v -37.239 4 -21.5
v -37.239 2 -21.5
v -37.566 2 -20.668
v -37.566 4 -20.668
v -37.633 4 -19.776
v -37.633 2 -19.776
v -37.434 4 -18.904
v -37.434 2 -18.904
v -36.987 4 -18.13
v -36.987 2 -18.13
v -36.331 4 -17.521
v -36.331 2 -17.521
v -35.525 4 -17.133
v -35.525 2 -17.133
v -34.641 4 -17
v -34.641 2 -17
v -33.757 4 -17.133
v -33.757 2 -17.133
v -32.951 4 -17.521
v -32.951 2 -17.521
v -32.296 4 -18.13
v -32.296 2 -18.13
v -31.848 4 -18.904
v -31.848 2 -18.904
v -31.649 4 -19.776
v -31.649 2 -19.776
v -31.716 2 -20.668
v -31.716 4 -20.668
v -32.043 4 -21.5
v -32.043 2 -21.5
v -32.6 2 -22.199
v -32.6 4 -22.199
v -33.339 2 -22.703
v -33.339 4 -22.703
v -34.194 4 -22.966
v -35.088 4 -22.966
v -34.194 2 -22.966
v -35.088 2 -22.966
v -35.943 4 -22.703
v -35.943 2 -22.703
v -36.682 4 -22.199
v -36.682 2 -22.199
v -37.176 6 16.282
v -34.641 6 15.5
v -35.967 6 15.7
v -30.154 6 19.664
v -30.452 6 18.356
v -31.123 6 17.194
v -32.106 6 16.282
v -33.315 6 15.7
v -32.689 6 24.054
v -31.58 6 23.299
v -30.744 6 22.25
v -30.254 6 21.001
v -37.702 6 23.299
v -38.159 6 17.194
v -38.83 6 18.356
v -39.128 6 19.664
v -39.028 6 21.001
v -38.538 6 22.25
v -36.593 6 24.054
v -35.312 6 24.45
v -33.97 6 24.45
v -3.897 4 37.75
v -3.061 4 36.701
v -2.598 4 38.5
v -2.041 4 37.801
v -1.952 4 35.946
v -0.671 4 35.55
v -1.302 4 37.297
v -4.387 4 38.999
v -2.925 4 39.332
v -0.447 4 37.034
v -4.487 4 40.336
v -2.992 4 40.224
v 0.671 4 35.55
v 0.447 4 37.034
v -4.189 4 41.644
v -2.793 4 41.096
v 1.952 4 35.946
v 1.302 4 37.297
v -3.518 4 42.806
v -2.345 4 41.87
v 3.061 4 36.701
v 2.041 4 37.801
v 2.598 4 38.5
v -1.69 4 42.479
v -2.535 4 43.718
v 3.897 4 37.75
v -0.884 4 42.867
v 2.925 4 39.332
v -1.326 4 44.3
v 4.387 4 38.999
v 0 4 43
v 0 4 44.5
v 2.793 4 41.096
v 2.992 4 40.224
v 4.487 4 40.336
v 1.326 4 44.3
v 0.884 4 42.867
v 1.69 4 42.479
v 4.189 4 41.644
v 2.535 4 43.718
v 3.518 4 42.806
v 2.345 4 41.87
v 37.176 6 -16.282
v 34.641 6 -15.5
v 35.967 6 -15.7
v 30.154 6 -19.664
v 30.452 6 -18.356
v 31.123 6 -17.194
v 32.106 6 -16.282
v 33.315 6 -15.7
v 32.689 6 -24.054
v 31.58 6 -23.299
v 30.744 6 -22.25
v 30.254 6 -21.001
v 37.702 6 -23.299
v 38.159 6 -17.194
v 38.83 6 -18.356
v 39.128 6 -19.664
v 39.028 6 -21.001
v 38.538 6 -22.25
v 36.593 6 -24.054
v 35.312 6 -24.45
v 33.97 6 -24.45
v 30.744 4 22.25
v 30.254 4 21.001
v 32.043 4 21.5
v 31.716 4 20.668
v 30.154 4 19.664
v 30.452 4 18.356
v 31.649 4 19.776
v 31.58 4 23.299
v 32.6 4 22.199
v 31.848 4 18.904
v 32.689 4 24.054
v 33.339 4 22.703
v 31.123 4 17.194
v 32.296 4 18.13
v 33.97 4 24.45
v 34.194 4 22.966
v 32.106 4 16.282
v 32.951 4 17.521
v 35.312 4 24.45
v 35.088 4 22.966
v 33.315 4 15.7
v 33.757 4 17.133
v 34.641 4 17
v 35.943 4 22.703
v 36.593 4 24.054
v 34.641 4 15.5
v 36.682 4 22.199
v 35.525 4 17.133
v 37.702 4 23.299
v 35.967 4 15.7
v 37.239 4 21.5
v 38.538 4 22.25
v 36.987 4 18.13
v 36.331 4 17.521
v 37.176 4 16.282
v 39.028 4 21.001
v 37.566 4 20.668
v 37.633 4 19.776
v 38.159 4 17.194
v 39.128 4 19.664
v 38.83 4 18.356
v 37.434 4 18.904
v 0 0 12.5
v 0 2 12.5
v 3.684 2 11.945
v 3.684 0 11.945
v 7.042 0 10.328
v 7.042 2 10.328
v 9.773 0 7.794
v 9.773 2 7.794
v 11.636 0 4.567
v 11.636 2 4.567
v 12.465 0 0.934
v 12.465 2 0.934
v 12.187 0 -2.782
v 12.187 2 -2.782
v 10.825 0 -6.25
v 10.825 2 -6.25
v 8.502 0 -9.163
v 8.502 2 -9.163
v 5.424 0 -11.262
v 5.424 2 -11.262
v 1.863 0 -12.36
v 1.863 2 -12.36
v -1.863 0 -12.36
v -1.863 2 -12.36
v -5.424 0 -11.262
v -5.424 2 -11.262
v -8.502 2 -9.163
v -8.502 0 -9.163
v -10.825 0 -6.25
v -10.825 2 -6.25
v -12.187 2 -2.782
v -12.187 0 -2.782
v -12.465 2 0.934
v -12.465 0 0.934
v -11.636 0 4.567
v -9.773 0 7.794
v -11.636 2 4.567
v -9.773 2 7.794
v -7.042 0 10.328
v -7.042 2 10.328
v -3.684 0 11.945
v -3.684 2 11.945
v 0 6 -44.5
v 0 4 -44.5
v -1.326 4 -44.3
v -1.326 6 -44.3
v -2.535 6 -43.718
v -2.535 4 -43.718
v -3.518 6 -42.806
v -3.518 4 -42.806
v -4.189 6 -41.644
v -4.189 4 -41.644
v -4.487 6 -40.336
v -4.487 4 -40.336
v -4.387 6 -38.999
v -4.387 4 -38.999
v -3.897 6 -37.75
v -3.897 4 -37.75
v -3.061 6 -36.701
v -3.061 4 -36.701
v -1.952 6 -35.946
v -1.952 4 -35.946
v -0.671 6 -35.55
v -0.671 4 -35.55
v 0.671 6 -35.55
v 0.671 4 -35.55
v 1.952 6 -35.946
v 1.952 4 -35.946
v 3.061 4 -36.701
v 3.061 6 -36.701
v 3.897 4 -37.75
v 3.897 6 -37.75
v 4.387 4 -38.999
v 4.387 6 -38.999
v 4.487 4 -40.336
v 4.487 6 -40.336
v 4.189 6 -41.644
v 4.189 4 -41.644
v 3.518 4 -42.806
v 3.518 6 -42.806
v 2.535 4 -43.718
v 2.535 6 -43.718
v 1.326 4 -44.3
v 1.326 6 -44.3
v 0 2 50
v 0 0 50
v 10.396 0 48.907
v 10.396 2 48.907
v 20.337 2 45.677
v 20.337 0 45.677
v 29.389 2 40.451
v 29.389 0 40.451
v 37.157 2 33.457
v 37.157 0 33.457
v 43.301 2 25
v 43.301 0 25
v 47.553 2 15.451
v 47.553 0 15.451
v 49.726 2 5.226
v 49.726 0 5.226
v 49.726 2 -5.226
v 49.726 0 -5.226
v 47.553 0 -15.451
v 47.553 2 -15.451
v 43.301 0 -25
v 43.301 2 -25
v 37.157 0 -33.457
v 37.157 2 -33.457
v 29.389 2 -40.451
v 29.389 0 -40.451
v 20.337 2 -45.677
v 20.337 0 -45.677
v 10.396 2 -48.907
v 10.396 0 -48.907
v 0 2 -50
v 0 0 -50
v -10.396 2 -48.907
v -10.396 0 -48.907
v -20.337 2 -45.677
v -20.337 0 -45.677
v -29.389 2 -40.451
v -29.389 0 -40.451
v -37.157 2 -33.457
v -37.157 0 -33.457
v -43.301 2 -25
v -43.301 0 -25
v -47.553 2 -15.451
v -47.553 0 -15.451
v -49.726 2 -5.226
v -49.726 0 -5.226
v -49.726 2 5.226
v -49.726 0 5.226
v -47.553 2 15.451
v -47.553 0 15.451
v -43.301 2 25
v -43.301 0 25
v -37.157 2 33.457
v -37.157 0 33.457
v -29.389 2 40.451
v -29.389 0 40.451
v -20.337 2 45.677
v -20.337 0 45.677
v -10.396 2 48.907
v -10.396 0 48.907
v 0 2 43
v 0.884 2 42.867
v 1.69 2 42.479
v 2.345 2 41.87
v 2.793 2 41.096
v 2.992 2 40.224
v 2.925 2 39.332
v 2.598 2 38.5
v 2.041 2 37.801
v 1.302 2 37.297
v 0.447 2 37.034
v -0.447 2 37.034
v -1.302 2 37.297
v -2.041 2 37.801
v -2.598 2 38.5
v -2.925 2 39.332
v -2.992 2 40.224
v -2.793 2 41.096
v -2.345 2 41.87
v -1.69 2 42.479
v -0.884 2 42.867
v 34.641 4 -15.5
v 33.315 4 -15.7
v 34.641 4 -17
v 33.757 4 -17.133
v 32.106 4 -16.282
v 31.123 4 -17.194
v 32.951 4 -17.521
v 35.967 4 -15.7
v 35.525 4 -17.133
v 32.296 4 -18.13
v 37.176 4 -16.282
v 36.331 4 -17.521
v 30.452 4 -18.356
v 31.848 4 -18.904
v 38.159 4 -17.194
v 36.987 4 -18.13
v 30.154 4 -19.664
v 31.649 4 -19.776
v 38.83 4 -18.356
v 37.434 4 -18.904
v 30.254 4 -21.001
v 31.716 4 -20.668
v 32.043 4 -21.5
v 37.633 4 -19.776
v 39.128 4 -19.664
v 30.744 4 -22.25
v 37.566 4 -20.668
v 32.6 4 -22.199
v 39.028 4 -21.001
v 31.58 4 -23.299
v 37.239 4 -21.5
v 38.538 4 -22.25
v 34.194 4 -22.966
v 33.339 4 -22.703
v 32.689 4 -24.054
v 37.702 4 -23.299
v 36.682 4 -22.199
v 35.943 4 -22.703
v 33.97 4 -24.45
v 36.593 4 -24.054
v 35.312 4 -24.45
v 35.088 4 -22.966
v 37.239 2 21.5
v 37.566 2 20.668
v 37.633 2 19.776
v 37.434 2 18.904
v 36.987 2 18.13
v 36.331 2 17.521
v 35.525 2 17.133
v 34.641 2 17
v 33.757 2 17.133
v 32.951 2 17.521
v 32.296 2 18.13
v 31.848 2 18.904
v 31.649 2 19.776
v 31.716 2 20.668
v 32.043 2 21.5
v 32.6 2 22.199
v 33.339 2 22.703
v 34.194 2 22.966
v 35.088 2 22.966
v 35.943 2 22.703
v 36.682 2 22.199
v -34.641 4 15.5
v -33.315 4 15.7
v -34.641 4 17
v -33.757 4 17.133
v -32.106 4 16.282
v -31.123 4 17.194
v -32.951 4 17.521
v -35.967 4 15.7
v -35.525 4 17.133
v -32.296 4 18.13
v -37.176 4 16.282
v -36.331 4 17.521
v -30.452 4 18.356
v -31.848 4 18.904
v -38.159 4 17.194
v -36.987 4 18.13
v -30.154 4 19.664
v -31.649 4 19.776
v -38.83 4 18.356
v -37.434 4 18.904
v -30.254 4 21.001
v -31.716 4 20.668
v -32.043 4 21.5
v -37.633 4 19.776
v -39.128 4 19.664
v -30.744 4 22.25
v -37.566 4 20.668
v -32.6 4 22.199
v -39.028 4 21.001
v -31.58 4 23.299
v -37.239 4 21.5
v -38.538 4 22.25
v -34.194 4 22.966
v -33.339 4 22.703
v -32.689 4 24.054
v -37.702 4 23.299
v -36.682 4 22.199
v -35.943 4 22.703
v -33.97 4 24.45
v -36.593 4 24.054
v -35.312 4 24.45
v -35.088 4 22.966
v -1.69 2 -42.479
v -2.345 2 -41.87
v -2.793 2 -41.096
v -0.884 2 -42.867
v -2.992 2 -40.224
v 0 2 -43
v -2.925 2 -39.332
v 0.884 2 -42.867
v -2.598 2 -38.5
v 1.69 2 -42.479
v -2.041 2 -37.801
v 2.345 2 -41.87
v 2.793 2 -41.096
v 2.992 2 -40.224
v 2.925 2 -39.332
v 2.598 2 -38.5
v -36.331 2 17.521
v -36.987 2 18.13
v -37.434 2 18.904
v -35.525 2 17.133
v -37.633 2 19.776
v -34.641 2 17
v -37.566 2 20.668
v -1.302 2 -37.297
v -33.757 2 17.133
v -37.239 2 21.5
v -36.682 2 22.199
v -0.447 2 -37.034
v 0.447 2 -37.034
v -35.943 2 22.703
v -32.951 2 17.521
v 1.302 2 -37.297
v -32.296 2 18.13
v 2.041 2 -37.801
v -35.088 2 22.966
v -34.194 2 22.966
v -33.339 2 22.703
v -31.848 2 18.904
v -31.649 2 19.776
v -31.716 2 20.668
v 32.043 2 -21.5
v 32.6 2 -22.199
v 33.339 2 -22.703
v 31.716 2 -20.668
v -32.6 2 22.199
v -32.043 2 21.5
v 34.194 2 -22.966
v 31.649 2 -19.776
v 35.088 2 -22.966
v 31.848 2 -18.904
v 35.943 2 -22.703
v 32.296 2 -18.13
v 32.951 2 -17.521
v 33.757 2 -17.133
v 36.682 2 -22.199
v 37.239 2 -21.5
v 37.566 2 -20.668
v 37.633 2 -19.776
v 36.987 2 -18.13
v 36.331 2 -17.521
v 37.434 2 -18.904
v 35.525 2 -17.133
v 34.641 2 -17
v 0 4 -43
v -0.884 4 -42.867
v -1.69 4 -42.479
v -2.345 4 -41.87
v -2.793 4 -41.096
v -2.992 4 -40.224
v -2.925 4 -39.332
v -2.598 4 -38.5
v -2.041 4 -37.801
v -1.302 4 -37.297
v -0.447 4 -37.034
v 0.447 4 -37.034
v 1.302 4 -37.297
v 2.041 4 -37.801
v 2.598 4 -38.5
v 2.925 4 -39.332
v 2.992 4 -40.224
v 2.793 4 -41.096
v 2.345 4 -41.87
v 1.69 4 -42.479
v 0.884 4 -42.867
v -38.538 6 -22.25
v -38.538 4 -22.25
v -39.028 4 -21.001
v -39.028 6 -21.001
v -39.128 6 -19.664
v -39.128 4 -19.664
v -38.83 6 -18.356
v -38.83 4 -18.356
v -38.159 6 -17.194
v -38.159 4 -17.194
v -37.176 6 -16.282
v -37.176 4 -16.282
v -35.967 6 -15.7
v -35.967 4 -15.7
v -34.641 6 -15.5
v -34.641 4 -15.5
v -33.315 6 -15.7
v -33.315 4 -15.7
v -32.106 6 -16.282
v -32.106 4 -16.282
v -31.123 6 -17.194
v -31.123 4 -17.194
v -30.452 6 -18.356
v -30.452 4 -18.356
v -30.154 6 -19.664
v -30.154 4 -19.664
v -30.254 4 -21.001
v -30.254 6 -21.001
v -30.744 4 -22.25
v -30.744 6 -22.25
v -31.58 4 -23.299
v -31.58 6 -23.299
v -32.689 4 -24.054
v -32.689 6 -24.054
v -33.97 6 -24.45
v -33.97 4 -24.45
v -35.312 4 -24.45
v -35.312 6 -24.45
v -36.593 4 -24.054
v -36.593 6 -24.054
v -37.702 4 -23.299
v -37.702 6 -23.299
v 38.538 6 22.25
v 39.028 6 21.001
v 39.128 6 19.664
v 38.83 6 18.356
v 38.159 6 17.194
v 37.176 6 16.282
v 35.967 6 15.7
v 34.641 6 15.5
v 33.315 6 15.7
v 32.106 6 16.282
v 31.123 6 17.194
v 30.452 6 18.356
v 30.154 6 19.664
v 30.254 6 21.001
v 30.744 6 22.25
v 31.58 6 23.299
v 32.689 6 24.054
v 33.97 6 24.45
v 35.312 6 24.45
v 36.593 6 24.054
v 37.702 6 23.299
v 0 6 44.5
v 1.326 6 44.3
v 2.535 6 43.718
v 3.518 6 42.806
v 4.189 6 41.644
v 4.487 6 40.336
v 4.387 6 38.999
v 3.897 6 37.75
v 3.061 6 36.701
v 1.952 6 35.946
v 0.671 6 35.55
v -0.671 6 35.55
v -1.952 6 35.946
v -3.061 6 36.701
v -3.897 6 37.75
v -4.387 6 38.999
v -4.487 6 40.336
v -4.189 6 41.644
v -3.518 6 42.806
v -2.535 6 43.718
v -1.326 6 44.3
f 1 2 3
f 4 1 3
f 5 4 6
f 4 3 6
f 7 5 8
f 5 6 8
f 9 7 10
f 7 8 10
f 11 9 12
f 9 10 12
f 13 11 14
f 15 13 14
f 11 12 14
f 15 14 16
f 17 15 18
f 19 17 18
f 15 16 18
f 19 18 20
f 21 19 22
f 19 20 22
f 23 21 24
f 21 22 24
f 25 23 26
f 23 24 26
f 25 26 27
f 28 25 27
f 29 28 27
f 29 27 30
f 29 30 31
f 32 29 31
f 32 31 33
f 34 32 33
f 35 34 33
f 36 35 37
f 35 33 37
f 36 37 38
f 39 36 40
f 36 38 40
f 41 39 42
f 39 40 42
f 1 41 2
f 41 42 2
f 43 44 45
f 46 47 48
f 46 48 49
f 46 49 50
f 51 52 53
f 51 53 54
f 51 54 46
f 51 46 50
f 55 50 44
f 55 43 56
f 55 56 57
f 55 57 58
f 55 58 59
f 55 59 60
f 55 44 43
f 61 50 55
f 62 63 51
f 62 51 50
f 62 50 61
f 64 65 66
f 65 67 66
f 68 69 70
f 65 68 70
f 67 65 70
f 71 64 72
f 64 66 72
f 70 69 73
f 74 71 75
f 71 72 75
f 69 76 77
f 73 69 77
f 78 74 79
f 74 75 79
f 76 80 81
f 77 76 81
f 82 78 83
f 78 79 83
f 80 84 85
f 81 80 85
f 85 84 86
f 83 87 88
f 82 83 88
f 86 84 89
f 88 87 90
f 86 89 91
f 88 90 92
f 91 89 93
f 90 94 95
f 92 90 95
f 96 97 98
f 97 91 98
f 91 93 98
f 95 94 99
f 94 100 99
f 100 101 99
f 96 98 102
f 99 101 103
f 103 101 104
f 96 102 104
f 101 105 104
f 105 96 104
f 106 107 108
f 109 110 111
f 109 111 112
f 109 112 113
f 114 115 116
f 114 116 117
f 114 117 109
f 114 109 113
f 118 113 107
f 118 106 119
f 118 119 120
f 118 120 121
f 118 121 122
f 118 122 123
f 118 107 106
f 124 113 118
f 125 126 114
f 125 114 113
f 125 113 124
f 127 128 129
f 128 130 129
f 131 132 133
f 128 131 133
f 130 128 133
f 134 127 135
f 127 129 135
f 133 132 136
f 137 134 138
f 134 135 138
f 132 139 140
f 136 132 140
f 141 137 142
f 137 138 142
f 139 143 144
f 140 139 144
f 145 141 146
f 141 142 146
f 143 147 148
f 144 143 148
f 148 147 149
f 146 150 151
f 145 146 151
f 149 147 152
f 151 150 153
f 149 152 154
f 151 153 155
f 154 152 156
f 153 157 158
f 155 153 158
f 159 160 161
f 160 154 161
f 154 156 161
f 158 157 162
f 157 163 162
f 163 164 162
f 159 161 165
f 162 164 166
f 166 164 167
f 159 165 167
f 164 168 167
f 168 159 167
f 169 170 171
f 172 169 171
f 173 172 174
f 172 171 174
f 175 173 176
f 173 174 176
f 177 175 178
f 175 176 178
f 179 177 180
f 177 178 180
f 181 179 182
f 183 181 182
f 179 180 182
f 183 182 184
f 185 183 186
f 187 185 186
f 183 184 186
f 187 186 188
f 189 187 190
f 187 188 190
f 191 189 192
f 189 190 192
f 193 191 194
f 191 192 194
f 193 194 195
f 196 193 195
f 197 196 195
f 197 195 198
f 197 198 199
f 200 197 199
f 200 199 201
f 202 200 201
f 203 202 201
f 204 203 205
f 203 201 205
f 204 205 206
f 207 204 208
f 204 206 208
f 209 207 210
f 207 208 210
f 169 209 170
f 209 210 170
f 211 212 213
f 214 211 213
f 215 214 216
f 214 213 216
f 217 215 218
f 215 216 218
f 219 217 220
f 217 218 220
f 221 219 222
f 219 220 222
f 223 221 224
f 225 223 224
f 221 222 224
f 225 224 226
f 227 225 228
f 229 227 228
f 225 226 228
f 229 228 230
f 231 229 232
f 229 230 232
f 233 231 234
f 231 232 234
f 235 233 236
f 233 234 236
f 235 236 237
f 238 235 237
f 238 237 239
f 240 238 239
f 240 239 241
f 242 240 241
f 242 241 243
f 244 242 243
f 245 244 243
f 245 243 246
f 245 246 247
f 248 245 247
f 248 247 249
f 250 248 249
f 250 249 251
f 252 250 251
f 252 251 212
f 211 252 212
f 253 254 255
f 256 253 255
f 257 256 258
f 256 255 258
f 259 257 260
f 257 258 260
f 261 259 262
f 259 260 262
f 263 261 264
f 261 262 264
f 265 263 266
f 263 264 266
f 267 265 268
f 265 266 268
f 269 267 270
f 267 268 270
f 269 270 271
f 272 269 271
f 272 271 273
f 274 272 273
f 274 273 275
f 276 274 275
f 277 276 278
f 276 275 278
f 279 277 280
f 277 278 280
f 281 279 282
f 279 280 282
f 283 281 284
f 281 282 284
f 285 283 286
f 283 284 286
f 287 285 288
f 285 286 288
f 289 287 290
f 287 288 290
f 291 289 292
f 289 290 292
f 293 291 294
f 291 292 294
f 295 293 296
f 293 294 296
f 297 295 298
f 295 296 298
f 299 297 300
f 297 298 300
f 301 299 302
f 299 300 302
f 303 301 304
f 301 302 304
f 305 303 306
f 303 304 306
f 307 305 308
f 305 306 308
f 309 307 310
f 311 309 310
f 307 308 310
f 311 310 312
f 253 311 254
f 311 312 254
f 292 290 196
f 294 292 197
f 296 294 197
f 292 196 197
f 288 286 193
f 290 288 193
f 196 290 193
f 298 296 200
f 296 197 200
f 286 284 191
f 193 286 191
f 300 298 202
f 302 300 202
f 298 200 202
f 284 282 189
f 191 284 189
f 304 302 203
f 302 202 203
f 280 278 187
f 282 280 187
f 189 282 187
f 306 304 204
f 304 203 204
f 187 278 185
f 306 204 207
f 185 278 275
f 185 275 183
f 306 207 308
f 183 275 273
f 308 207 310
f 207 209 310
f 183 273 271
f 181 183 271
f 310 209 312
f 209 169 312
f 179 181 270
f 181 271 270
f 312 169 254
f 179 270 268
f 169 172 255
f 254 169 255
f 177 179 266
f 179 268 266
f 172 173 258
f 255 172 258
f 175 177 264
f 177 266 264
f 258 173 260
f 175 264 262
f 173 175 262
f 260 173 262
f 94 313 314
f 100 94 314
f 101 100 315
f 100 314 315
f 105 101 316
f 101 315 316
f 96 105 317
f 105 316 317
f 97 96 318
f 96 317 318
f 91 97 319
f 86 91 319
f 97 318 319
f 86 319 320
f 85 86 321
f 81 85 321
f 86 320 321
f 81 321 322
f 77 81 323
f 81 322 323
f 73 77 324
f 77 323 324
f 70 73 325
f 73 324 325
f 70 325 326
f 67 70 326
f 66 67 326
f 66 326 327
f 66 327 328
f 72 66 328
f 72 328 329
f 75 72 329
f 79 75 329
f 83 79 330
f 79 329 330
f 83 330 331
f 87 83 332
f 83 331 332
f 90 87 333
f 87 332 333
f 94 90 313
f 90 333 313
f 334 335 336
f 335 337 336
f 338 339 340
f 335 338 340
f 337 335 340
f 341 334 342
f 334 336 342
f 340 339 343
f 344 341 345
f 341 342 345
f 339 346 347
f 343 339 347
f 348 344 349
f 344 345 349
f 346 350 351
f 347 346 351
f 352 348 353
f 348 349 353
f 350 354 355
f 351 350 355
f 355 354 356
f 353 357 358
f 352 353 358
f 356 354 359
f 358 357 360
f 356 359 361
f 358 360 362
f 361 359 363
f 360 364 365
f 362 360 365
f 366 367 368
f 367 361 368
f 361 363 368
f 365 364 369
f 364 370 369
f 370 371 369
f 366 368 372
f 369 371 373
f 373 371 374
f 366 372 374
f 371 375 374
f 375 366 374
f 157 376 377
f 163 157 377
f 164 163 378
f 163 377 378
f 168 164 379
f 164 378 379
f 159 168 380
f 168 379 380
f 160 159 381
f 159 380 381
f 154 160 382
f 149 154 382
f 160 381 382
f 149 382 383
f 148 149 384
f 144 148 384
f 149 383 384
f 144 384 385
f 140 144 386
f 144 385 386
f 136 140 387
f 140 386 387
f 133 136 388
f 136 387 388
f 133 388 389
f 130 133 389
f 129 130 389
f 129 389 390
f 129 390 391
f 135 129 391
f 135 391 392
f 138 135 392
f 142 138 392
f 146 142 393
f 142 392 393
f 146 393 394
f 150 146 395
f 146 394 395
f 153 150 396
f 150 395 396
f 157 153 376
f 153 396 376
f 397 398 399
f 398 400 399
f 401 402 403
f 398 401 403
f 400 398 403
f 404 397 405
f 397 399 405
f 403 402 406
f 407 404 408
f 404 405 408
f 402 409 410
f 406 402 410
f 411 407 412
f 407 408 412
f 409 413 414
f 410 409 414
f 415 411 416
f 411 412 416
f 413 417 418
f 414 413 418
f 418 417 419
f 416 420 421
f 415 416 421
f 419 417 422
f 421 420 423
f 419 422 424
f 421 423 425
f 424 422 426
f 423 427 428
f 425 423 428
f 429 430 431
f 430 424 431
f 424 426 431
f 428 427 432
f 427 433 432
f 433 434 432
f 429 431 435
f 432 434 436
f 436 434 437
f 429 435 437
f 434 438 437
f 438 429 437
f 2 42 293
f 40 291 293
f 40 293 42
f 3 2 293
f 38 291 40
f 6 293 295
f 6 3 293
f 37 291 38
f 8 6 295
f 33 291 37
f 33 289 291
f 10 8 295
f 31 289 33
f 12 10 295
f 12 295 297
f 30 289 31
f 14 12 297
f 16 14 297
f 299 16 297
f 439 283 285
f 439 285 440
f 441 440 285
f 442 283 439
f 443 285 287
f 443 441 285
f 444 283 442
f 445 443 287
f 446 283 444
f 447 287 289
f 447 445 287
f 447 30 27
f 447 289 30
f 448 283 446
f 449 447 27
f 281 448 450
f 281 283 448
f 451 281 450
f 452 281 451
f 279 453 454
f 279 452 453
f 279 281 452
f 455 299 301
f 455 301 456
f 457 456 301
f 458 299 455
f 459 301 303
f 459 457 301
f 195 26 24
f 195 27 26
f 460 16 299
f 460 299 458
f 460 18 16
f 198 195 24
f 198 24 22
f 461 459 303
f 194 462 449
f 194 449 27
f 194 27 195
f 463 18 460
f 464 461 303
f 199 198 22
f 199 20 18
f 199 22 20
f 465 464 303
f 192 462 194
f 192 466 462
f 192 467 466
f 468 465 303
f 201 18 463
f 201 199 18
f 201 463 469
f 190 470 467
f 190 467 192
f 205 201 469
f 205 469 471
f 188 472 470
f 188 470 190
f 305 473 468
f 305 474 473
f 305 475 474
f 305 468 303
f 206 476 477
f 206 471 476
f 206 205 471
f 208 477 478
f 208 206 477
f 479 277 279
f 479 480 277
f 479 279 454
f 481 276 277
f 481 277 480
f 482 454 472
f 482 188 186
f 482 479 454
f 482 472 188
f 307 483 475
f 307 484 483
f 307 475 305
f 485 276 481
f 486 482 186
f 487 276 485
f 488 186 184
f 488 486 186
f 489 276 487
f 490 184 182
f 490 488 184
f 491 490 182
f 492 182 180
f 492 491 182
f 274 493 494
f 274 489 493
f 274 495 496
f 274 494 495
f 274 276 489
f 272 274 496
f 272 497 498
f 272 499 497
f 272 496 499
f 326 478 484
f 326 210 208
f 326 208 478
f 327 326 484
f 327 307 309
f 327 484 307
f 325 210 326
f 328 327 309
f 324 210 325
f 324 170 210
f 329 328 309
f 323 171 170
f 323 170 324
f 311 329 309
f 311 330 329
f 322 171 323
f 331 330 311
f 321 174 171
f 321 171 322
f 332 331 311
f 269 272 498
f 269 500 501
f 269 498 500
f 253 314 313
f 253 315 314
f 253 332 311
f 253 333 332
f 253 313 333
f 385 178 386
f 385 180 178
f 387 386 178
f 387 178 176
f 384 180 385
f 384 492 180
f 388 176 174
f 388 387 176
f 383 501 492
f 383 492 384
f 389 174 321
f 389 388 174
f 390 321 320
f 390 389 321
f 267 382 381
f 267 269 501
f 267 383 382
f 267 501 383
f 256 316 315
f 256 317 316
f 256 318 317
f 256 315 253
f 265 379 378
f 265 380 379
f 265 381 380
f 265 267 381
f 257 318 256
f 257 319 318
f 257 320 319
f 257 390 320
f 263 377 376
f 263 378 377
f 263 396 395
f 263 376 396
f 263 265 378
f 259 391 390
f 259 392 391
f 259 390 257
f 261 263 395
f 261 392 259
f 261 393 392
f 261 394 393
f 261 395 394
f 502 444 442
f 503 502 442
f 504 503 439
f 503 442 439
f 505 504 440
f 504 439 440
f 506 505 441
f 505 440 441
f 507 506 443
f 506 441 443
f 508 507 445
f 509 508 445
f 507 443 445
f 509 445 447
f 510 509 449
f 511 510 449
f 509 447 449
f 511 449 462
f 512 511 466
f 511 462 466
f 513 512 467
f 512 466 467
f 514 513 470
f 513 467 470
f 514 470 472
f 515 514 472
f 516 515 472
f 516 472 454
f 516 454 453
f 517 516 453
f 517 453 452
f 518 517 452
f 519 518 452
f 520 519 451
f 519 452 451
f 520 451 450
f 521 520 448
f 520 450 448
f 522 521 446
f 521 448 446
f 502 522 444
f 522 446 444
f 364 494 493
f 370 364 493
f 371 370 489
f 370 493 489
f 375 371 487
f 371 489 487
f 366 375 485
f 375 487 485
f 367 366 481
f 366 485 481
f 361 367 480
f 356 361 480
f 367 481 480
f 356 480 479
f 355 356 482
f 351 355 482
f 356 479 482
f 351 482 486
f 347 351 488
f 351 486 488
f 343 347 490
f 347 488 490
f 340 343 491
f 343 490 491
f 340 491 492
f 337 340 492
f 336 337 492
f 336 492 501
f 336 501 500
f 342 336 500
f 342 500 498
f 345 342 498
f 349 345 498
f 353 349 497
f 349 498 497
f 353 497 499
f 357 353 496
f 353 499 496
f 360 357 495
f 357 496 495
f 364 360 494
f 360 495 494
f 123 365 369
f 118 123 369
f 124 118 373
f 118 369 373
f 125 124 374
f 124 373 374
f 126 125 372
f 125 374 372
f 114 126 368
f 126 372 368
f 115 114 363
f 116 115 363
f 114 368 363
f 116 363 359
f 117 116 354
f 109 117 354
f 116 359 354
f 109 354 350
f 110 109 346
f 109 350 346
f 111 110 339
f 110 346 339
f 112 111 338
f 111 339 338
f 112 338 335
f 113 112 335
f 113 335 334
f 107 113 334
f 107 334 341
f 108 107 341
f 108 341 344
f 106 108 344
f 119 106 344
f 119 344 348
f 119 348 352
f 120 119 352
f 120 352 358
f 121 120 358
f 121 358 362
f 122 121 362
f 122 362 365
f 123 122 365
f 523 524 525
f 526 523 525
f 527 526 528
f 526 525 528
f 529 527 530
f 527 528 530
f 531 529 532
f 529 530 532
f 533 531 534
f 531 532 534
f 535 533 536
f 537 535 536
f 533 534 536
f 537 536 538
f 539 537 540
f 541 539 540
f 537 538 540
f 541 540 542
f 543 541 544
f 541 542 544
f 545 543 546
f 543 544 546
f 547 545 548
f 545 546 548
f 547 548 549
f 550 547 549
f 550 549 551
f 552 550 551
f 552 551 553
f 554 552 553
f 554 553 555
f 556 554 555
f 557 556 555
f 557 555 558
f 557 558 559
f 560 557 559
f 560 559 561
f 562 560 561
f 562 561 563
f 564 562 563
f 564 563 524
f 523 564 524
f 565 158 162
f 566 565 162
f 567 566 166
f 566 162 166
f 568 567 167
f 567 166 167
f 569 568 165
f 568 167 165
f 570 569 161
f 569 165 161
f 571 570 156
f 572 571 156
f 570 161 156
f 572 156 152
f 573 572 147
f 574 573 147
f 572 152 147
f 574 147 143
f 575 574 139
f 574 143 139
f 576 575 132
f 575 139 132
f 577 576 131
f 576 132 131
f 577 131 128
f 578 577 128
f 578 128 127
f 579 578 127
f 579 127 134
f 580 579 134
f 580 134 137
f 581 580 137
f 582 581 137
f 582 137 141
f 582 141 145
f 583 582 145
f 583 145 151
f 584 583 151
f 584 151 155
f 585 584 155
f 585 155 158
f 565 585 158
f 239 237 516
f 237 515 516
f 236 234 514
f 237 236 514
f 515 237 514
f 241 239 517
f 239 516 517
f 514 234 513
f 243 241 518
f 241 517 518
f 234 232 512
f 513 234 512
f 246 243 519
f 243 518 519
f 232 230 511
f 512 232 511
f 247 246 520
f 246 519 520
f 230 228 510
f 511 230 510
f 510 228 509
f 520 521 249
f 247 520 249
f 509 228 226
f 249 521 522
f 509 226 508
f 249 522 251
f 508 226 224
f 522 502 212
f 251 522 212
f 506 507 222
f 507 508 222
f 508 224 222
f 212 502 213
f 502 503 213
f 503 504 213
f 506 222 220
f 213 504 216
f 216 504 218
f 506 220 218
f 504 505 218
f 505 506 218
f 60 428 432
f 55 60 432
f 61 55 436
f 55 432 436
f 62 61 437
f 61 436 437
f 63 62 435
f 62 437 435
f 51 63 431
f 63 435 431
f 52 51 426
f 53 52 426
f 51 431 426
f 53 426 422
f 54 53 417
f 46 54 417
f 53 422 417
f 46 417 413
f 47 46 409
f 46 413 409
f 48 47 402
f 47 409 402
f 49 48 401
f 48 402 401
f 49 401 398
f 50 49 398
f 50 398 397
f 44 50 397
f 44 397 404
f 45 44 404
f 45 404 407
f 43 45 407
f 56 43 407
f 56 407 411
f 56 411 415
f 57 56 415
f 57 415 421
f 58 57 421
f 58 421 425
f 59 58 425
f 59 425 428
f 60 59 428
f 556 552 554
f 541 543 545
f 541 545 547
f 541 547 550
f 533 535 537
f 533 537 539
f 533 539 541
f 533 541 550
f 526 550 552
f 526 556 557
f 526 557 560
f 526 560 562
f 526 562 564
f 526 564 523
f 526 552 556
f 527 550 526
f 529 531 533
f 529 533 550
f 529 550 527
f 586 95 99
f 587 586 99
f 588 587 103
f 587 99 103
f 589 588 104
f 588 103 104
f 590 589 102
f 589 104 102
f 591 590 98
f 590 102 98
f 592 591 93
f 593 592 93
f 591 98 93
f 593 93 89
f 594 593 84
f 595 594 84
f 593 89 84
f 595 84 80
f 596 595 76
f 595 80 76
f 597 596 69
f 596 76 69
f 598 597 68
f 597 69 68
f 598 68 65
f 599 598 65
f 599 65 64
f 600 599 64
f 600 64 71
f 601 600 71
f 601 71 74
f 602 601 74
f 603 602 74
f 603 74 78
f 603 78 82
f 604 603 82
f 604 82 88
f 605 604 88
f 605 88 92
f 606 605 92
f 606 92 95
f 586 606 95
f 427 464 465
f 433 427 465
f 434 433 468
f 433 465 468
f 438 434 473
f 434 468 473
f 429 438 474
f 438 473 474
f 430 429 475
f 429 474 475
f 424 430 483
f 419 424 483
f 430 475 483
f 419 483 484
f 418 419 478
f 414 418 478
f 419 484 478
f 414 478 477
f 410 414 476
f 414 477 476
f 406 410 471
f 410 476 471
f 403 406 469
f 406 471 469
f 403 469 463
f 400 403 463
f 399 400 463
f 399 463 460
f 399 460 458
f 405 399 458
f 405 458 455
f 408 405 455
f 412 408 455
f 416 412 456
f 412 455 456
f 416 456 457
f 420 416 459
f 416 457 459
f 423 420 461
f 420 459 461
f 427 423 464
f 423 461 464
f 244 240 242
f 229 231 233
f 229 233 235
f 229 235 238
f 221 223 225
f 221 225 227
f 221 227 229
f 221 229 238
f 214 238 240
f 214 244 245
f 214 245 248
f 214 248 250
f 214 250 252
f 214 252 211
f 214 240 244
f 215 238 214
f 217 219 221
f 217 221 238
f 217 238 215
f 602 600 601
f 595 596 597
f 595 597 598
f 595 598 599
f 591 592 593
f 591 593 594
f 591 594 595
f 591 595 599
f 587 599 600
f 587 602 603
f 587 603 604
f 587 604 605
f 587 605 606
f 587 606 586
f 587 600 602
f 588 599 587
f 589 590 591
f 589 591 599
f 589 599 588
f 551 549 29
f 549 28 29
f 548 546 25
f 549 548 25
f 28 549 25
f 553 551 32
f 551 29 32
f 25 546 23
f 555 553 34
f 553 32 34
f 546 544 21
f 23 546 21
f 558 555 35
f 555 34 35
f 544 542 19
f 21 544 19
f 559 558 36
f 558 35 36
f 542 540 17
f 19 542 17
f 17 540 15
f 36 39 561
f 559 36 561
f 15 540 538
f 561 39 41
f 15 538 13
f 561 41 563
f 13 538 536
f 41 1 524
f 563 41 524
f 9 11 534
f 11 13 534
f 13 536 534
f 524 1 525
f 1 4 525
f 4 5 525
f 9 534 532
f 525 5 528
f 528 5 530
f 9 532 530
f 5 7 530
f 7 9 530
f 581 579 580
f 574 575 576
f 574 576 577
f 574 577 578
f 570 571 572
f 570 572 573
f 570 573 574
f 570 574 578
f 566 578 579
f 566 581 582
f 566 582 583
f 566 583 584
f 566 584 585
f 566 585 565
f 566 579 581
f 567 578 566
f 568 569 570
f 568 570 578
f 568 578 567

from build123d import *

# Parameters (mm, degrees)
SKETCH1_R           = 50
BOSS_EXTRUDE1_DEPTH = 2
SKETCH2_R           = 12.5
CUT_EXTRUDE1_DEPTH  = 2
SKETCH2_3_R         = 4.5
BOSS_EXTRUDE2_DEPTH = 4
SKETCH2_4_R         = 4.5
SKETCH2_4_R_2       = 3
CUT_EXTRUDE2_DEPTH  = 2
CIRPATTERN1_COUNT   = 12


with BuildPart() as part:
    # Sketch1 → Boss-Extrude1 (new body)
    with BuildSketch(Plane(origin=(0, 0, 0), x_dir=(1, 0, 0), z_dir=(0, 1, 0))):
        with Locations(Location((0, 0, 0), (0, 0, 270))):
            Circle(SKETCH1_R)
    extrude(amount=BOSS_EXTRUDE1_DEPTH)

    # Sketch2 → Cut-Extrude1 (cut)
    with BuildSketch(Plane(origin=(0, 2, 0), x_dir=(1, 0, 0), z_dir=(0, 1, 0))):
        with Locations(Location((0, 0, 0), (0, 0, 270))):
            Circle(SKETCH2_R)
    extrude(amount=-CUT_EXTRUDE1_DEPTH, mode=Mode.SUBTRACT)

    # Sketch2<3> → Boss-Extrude2 (add)
    with BuildSketch(Plane(origin=(0, 2, 0), x_dir=(1, 0, 0), z_dir=(0, 1, 0))):
        with Locations(Location((0, -40, 0), (0, 0, 270))):
            Circle(SKETCH2_3_R)
    boss_extrude2 = extrude(amount=BOSS_EXTRUDE2_DEPTH)

    # Sketch2<4> → Cut-Extrude2 (cut)
    with BuildSketch(Plane(origin=(0, 2, 0), x_dir=(1, 0, 0), z_dir=(0, 1, 0))):
        with Locations(Location((0, -40, 0), (0, 0, 270))):
            Circle(SKETCH2_4_R)
        with Locations(Location((0, -40, 0), (0, 0, 270))):
            Circle(SKETCH2_4_R_2, mode=Mode.SUBTRACT)
    cut_extrude2 = extrude(amount=CUT_EXTRUDE2_DEPTH, mode=Mode.SUBTRACT)

    # CirPattern1: Boss-Extrude2, Cut-Extrude2 ×12 about axis, 6 skipped
    cirpattern1_axis = Axis((0, -35.355339059, 0), (0, 1, 0))
    add([boss_extrude2.rotate(cirpattern1_axis, i * 360 / CIRPATTERN1_COUNT) for i in range(1, CIRPATTERN1_COUNT) if i not in (1, 3, 5, 7, 9, 11)])
    add([cut_extrude2.rotate(cirpattern1_axis, i * 360 / CIRPATTERN1_COUNT) for i in range(1, CIRPATTERN1_COUNT) if i not in (1, 3, 5, 7, 9, 11)], mode=Mode.SUBTRACT)


solid = part.part
